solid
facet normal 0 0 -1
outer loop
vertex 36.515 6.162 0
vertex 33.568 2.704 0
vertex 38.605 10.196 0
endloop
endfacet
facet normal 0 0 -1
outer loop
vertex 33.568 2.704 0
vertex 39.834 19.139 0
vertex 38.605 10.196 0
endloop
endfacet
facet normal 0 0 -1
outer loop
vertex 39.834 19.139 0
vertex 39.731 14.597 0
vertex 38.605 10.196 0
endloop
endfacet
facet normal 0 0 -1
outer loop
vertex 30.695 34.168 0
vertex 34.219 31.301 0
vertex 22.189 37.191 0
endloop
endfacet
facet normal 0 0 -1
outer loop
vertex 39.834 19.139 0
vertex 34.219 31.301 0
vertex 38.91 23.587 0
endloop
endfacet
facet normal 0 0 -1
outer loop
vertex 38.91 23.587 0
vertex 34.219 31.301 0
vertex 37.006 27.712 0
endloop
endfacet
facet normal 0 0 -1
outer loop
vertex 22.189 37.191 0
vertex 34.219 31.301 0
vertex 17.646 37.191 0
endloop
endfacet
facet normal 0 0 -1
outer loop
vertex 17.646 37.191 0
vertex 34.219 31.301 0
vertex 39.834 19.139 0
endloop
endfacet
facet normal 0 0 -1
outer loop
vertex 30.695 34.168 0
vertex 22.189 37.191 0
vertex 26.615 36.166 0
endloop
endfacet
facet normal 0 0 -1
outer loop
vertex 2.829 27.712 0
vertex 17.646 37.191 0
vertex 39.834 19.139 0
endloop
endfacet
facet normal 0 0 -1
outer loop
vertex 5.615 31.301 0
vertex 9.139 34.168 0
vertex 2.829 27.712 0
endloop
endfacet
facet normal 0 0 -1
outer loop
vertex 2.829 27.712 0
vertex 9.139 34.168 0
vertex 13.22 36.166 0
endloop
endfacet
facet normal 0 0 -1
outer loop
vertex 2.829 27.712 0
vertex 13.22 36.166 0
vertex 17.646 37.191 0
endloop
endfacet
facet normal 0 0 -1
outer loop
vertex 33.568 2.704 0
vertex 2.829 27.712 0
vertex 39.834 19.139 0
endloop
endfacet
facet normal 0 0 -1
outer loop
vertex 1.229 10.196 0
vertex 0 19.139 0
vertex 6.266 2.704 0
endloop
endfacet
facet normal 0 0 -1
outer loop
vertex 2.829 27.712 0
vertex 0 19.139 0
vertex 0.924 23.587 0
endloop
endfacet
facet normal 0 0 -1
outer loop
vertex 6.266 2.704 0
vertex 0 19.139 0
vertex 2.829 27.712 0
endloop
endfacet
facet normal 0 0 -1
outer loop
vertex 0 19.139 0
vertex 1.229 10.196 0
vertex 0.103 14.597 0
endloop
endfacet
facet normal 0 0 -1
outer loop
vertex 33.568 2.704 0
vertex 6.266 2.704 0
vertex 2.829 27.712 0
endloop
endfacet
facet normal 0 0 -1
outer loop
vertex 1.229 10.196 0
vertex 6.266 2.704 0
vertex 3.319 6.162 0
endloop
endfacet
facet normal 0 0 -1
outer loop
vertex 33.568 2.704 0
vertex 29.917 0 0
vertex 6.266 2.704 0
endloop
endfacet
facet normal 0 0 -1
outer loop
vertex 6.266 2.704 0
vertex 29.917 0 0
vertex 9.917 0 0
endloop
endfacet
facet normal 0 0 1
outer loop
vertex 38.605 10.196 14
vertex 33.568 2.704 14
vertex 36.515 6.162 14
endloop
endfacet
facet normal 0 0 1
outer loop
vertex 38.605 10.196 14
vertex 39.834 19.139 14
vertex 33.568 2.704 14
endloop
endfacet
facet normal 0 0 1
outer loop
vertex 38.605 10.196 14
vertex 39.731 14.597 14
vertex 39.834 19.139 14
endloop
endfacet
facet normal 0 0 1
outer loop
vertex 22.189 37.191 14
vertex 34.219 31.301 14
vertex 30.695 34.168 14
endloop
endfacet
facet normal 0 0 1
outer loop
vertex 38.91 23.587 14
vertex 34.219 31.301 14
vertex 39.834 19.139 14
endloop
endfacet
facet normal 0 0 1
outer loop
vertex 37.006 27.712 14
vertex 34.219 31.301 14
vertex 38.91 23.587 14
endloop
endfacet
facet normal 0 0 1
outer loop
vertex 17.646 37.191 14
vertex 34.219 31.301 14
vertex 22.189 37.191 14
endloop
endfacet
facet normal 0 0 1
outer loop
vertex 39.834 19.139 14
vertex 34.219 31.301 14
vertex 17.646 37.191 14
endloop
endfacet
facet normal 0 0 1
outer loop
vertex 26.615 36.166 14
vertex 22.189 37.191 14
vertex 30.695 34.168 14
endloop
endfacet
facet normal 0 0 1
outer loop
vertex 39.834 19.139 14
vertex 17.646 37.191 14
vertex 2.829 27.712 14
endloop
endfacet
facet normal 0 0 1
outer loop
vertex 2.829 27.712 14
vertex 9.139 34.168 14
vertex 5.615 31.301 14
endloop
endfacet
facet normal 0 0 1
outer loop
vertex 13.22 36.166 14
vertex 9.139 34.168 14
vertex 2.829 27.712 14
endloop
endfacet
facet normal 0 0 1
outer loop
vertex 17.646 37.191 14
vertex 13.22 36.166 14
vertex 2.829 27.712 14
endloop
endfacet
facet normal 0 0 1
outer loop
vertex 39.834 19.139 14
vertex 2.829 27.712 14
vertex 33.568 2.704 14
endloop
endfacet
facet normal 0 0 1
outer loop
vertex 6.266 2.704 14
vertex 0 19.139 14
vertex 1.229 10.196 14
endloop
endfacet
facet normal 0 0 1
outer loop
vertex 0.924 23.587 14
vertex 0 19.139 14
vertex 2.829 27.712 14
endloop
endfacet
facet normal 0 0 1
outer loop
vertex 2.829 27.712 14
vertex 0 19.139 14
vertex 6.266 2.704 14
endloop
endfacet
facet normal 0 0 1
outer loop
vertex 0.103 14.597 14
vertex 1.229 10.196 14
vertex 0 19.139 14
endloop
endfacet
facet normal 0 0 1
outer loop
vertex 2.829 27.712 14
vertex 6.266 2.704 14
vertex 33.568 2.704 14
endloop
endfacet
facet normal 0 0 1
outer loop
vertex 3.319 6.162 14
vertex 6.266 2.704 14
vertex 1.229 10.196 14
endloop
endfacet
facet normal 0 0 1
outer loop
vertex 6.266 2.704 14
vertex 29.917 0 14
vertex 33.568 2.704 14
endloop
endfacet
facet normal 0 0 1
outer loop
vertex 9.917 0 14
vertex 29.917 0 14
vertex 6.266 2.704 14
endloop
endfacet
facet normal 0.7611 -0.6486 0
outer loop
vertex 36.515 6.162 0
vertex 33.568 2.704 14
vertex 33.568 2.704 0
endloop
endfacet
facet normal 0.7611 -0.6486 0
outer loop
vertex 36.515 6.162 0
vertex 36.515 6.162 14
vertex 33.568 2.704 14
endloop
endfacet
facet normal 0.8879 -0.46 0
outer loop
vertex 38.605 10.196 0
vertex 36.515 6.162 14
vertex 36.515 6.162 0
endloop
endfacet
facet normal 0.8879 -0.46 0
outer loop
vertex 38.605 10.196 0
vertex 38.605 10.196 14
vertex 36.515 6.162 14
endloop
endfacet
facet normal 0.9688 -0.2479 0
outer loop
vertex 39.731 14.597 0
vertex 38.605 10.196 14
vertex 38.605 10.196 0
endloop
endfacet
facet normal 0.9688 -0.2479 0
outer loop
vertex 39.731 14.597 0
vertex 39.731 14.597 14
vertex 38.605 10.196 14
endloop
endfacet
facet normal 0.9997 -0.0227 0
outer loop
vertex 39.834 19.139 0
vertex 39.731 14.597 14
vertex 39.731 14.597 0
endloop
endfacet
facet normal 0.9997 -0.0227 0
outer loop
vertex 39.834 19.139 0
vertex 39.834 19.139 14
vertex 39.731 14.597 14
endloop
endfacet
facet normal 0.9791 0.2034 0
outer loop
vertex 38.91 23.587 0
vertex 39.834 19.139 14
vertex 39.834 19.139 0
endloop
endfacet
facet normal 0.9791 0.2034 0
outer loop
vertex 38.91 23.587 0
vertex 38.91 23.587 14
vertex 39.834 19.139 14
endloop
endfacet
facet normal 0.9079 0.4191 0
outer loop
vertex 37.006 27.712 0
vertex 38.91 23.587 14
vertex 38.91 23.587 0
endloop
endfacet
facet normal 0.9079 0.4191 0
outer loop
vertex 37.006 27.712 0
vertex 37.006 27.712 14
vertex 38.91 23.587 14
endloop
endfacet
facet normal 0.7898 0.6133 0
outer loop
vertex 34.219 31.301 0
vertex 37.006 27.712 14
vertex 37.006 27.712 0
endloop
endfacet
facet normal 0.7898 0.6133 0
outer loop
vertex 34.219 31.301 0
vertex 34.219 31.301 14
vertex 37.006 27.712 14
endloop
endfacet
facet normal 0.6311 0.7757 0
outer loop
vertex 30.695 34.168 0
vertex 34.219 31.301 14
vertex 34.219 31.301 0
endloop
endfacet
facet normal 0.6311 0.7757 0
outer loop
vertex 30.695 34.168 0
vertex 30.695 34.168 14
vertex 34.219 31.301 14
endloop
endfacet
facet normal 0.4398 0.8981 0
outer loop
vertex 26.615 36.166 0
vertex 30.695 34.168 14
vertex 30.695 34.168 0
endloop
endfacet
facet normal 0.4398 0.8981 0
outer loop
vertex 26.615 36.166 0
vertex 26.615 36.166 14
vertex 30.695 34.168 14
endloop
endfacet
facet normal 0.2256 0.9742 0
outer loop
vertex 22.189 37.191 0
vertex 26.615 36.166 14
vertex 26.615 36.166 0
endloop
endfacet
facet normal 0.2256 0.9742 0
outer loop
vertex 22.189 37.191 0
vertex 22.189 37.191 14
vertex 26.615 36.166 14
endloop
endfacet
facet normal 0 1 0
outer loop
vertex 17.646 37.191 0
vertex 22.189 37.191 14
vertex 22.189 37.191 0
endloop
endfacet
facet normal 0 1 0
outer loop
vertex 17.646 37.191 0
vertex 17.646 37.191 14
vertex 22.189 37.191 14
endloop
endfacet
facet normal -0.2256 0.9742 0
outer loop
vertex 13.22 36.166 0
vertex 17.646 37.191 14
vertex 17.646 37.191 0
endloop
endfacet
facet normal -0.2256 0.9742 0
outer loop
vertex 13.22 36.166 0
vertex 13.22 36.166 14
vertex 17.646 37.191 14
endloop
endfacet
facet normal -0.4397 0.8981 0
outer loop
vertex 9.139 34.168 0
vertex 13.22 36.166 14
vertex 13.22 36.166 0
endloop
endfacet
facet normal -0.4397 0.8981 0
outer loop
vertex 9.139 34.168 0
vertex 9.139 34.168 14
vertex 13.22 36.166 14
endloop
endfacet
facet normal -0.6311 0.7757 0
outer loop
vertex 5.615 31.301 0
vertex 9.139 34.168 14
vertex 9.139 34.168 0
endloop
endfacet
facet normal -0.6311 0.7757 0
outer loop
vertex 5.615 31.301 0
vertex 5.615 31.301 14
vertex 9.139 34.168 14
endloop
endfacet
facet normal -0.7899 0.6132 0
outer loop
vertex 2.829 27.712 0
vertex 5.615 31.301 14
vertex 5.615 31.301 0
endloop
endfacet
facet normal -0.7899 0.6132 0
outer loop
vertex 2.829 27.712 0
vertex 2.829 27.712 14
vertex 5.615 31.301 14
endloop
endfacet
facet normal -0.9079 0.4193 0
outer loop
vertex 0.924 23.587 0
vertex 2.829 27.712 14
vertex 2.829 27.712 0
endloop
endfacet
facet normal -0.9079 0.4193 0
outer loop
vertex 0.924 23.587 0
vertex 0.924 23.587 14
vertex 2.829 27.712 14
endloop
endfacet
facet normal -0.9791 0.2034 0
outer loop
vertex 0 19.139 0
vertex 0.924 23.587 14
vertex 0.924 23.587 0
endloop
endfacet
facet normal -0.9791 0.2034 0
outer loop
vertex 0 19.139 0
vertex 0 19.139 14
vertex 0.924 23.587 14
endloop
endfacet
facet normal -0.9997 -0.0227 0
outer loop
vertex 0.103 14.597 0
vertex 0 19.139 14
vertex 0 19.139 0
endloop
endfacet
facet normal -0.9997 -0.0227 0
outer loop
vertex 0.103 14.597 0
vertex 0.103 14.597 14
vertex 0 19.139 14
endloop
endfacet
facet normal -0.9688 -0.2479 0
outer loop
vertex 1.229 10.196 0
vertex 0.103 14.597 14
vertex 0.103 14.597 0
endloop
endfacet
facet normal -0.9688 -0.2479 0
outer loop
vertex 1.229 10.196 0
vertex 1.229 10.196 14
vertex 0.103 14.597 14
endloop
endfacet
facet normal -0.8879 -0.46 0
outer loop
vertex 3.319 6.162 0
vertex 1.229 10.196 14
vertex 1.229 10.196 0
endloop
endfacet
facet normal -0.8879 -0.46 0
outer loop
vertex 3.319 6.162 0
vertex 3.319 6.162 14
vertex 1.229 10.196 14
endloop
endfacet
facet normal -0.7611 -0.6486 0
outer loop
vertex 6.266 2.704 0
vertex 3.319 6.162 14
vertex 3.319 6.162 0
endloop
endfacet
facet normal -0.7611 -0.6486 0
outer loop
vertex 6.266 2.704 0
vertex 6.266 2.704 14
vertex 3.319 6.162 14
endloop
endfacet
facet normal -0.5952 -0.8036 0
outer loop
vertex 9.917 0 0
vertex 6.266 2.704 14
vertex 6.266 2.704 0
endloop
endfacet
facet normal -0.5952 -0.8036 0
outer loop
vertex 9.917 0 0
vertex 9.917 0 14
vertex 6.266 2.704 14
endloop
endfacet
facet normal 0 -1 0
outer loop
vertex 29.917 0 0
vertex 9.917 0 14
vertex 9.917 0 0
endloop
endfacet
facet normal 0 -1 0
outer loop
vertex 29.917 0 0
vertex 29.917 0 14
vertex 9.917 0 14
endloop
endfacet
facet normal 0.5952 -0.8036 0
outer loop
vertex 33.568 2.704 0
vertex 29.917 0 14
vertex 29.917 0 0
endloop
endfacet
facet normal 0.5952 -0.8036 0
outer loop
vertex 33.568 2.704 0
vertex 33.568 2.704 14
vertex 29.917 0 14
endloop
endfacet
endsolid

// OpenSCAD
$fn = 32;

// ----------------------------------------------------------------------
// Flat adaptor: single_d, 14 mm thick
// ----------------------------------------------------------------------

// --- parameters (mm) ---
profile_height = 14;      // extrusion height
profile_points = 24;      // points of the closed outline

profile = [[29.917, 0], [33.568, 2.704], [36.515, 6.162], [38.605, 10.196], [39.731, 14.597], [39.834, 19.139], [38.91, 23.587], [37.006, 27.712], [34.219, 31.301], [30.695, 34.168], [26.615, 36.166], [22.189, 37.191], [17.646, 37.191], [13.22, 36.166], [9.139, 34.168], [5.615, 31.301], [2.829, 27.712], [0.924, 23.587], [0, 19.139], [0.103, 14.597], [1.229, 10.196], [3.319, 6.162], [6.266, 2.704], [9.917, 0]];  // single closed polygon, 24 points, counter clockwise

// --- the one profile operation ---
linear_extrude(height = profile_height) polygon(points = profile);
